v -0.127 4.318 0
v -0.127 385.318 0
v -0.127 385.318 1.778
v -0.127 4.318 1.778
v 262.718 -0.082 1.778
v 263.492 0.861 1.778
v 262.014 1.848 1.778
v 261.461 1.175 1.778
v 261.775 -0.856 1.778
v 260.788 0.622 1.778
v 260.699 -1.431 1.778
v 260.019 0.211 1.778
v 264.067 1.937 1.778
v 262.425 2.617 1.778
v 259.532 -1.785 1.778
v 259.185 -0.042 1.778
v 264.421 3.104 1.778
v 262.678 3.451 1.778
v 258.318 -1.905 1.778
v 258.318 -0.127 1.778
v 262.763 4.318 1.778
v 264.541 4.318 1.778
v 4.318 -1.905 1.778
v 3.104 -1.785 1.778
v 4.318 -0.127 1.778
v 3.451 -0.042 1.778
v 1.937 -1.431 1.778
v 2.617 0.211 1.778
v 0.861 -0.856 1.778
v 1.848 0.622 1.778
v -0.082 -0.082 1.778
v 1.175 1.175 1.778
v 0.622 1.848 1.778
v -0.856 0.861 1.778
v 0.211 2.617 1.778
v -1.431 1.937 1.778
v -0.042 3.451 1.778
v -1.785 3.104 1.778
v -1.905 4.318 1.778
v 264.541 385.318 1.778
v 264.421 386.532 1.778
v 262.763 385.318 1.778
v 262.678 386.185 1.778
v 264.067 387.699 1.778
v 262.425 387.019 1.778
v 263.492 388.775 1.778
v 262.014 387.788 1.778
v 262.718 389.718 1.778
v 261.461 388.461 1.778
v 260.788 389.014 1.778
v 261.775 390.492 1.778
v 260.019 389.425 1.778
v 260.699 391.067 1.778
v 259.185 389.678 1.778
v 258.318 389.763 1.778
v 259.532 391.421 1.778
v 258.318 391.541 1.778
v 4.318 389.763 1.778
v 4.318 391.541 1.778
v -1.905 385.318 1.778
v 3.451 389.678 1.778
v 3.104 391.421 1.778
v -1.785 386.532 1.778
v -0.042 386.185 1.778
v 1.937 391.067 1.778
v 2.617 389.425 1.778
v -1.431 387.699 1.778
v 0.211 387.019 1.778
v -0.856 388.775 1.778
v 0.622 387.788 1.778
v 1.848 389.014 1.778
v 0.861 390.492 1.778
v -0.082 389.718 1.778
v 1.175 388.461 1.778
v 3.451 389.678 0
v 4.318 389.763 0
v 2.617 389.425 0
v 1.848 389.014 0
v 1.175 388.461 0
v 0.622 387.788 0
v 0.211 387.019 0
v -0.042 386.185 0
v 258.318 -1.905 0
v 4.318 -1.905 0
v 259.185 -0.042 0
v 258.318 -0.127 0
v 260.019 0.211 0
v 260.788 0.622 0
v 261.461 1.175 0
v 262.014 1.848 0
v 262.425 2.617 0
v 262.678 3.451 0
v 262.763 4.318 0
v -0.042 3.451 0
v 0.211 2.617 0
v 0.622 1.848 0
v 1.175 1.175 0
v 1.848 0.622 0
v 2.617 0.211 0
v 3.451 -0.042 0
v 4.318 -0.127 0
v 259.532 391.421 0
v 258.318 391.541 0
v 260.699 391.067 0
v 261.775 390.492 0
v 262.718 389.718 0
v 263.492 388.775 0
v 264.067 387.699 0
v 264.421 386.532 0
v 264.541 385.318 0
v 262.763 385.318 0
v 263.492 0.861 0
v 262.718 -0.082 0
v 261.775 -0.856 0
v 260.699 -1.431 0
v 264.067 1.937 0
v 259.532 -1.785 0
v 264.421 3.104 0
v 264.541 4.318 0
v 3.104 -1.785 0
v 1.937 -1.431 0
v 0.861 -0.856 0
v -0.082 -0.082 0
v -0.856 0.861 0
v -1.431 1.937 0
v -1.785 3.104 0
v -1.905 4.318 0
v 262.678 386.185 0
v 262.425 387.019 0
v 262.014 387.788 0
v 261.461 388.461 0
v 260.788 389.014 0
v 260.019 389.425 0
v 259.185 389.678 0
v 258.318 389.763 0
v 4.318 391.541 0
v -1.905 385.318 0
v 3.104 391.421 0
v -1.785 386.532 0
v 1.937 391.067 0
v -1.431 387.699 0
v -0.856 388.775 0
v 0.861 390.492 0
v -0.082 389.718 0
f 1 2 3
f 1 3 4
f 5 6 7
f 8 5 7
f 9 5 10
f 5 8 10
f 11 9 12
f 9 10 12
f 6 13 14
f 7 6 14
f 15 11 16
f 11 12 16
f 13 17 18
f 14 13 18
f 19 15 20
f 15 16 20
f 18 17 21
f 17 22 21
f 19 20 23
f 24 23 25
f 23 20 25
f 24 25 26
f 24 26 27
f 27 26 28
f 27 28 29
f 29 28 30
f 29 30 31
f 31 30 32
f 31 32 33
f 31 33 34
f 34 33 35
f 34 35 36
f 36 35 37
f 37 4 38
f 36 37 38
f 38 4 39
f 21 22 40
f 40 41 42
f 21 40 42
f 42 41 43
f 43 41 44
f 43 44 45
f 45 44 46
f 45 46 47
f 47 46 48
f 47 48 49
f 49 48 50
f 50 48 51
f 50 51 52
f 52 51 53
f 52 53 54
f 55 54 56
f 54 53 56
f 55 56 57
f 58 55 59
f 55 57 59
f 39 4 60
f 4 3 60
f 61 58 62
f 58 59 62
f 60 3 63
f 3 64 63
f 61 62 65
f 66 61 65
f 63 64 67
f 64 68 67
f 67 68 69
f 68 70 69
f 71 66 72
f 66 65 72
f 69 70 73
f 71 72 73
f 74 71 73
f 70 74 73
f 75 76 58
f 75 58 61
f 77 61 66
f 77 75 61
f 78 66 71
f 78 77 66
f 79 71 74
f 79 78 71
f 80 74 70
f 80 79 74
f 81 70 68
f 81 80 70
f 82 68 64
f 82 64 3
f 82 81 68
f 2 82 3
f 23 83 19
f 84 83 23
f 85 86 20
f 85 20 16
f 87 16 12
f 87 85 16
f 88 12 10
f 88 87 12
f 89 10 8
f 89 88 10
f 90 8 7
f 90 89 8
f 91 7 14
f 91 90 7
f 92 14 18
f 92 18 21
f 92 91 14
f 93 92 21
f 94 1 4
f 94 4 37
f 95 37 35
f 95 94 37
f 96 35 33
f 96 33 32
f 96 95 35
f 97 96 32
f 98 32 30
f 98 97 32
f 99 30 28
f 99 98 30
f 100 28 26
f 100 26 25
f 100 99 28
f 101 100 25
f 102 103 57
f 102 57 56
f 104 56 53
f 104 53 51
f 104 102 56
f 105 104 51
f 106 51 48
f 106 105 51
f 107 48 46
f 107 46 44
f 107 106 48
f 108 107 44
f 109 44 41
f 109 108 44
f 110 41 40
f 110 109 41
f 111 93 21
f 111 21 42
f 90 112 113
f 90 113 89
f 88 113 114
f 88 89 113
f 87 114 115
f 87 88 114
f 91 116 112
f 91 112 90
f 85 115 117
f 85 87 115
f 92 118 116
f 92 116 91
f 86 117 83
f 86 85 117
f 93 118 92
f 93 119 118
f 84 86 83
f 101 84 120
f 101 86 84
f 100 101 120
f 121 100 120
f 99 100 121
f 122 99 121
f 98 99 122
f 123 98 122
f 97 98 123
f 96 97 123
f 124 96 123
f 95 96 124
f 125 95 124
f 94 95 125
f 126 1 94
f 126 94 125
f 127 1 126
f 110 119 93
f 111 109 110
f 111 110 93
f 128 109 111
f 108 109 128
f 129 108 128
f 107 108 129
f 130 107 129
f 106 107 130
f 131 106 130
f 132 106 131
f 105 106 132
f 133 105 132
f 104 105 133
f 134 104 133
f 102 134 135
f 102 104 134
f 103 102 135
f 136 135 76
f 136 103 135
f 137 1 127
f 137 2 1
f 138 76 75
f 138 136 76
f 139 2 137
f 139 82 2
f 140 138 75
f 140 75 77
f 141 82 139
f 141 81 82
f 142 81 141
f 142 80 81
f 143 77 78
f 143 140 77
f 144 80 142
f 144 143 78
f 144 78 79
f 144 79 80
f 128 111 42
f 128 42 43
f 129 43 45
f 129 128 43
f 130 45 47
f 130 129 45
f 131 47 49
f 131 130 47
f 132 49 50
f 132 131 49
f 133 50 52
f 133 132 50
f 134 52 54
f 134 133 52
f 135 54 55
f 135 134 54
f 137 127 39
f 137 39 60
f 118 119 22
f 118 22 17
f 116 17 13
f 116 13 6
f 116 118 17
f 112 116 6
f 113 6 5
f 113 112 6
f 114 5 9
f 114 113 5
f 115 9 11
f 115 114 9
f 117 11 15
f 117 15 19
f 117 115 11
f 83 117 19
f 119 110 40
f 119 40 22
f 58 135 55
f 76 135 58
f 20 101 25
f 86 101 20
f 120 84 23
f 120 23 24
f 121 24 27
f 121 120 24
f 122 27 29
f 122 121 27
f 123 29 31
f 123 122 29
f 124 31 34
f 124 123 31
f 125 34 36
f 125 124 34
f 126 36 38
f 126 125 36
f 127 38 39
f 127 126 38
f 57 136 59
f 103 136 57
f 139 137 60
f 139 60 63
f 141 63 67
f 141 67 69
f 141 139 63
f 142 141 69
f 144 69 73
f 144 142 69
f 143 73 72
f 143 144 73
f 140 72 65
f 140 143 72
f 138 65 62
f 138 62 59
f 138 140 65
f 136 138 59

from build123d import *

# Parameters (mm, degrees)
BOSS_EXTRUDE1_DEPTH = 1.778


with BuildPart() as part:
    # Sketch1 → Boss-Extrude1 (new body)
    with BuildSketch(Plane.XY):
        with BuildLine():
            ThreePointArc((4.318, -1.905), (-0.082325499, -0.082325499), (-1.905, 4.318))
            Line((-1.905, 4.318), (-1.905, 385.318))
            ThreePointArc((-1.905, 385.318), (-0.082325499, 389.718325499), (4.318, 391.541))
            Line((4.318, 391.541), (258.318, 391.541))
            ThreePointArc((258.318, 391.541), (262.718325499, 389.718325499), (264.541, 385.318))
            Line((264.541, 385.318), (264.541, 4.318))
            ThreePointArc((264.541, 4.318), (262.718325499, -0.082325499), (258.318, -1.905))
            Line((258.318, -1.905), (4.318, -1.905))
        make_face()
        with BuildLine():
            Line((4.318, -0.127), (258.318, -0.127))
            ThreePointArc((258.318, -0.127), (261.461089642, 1.174910358), (262.763, 4.318))
            Line((262.763, 4.318), (262.763, 385.318))
            ThreePointArc((262.763, 385.318), (261.461089642, 388.461089642), (258.318, 389.763))
            Line((258.318, 389.763), (4.318, 389.763))
            ThreePointArc((4.318, 389.763), (1.174910358, 388.461089642), (-0.127, 385.318))
            Line((-0.127, 385.318), (-0.127, 4.318))
            ThreePointArc((-0.127, 4.318), (1.174910358, 1.174910358), (4.318, -0.127))
        make_face(mode=Mode.SUBTRACT)
    extrude(amount=BOSS_EXTRUDE1_DEPTH)


solid = part.part
